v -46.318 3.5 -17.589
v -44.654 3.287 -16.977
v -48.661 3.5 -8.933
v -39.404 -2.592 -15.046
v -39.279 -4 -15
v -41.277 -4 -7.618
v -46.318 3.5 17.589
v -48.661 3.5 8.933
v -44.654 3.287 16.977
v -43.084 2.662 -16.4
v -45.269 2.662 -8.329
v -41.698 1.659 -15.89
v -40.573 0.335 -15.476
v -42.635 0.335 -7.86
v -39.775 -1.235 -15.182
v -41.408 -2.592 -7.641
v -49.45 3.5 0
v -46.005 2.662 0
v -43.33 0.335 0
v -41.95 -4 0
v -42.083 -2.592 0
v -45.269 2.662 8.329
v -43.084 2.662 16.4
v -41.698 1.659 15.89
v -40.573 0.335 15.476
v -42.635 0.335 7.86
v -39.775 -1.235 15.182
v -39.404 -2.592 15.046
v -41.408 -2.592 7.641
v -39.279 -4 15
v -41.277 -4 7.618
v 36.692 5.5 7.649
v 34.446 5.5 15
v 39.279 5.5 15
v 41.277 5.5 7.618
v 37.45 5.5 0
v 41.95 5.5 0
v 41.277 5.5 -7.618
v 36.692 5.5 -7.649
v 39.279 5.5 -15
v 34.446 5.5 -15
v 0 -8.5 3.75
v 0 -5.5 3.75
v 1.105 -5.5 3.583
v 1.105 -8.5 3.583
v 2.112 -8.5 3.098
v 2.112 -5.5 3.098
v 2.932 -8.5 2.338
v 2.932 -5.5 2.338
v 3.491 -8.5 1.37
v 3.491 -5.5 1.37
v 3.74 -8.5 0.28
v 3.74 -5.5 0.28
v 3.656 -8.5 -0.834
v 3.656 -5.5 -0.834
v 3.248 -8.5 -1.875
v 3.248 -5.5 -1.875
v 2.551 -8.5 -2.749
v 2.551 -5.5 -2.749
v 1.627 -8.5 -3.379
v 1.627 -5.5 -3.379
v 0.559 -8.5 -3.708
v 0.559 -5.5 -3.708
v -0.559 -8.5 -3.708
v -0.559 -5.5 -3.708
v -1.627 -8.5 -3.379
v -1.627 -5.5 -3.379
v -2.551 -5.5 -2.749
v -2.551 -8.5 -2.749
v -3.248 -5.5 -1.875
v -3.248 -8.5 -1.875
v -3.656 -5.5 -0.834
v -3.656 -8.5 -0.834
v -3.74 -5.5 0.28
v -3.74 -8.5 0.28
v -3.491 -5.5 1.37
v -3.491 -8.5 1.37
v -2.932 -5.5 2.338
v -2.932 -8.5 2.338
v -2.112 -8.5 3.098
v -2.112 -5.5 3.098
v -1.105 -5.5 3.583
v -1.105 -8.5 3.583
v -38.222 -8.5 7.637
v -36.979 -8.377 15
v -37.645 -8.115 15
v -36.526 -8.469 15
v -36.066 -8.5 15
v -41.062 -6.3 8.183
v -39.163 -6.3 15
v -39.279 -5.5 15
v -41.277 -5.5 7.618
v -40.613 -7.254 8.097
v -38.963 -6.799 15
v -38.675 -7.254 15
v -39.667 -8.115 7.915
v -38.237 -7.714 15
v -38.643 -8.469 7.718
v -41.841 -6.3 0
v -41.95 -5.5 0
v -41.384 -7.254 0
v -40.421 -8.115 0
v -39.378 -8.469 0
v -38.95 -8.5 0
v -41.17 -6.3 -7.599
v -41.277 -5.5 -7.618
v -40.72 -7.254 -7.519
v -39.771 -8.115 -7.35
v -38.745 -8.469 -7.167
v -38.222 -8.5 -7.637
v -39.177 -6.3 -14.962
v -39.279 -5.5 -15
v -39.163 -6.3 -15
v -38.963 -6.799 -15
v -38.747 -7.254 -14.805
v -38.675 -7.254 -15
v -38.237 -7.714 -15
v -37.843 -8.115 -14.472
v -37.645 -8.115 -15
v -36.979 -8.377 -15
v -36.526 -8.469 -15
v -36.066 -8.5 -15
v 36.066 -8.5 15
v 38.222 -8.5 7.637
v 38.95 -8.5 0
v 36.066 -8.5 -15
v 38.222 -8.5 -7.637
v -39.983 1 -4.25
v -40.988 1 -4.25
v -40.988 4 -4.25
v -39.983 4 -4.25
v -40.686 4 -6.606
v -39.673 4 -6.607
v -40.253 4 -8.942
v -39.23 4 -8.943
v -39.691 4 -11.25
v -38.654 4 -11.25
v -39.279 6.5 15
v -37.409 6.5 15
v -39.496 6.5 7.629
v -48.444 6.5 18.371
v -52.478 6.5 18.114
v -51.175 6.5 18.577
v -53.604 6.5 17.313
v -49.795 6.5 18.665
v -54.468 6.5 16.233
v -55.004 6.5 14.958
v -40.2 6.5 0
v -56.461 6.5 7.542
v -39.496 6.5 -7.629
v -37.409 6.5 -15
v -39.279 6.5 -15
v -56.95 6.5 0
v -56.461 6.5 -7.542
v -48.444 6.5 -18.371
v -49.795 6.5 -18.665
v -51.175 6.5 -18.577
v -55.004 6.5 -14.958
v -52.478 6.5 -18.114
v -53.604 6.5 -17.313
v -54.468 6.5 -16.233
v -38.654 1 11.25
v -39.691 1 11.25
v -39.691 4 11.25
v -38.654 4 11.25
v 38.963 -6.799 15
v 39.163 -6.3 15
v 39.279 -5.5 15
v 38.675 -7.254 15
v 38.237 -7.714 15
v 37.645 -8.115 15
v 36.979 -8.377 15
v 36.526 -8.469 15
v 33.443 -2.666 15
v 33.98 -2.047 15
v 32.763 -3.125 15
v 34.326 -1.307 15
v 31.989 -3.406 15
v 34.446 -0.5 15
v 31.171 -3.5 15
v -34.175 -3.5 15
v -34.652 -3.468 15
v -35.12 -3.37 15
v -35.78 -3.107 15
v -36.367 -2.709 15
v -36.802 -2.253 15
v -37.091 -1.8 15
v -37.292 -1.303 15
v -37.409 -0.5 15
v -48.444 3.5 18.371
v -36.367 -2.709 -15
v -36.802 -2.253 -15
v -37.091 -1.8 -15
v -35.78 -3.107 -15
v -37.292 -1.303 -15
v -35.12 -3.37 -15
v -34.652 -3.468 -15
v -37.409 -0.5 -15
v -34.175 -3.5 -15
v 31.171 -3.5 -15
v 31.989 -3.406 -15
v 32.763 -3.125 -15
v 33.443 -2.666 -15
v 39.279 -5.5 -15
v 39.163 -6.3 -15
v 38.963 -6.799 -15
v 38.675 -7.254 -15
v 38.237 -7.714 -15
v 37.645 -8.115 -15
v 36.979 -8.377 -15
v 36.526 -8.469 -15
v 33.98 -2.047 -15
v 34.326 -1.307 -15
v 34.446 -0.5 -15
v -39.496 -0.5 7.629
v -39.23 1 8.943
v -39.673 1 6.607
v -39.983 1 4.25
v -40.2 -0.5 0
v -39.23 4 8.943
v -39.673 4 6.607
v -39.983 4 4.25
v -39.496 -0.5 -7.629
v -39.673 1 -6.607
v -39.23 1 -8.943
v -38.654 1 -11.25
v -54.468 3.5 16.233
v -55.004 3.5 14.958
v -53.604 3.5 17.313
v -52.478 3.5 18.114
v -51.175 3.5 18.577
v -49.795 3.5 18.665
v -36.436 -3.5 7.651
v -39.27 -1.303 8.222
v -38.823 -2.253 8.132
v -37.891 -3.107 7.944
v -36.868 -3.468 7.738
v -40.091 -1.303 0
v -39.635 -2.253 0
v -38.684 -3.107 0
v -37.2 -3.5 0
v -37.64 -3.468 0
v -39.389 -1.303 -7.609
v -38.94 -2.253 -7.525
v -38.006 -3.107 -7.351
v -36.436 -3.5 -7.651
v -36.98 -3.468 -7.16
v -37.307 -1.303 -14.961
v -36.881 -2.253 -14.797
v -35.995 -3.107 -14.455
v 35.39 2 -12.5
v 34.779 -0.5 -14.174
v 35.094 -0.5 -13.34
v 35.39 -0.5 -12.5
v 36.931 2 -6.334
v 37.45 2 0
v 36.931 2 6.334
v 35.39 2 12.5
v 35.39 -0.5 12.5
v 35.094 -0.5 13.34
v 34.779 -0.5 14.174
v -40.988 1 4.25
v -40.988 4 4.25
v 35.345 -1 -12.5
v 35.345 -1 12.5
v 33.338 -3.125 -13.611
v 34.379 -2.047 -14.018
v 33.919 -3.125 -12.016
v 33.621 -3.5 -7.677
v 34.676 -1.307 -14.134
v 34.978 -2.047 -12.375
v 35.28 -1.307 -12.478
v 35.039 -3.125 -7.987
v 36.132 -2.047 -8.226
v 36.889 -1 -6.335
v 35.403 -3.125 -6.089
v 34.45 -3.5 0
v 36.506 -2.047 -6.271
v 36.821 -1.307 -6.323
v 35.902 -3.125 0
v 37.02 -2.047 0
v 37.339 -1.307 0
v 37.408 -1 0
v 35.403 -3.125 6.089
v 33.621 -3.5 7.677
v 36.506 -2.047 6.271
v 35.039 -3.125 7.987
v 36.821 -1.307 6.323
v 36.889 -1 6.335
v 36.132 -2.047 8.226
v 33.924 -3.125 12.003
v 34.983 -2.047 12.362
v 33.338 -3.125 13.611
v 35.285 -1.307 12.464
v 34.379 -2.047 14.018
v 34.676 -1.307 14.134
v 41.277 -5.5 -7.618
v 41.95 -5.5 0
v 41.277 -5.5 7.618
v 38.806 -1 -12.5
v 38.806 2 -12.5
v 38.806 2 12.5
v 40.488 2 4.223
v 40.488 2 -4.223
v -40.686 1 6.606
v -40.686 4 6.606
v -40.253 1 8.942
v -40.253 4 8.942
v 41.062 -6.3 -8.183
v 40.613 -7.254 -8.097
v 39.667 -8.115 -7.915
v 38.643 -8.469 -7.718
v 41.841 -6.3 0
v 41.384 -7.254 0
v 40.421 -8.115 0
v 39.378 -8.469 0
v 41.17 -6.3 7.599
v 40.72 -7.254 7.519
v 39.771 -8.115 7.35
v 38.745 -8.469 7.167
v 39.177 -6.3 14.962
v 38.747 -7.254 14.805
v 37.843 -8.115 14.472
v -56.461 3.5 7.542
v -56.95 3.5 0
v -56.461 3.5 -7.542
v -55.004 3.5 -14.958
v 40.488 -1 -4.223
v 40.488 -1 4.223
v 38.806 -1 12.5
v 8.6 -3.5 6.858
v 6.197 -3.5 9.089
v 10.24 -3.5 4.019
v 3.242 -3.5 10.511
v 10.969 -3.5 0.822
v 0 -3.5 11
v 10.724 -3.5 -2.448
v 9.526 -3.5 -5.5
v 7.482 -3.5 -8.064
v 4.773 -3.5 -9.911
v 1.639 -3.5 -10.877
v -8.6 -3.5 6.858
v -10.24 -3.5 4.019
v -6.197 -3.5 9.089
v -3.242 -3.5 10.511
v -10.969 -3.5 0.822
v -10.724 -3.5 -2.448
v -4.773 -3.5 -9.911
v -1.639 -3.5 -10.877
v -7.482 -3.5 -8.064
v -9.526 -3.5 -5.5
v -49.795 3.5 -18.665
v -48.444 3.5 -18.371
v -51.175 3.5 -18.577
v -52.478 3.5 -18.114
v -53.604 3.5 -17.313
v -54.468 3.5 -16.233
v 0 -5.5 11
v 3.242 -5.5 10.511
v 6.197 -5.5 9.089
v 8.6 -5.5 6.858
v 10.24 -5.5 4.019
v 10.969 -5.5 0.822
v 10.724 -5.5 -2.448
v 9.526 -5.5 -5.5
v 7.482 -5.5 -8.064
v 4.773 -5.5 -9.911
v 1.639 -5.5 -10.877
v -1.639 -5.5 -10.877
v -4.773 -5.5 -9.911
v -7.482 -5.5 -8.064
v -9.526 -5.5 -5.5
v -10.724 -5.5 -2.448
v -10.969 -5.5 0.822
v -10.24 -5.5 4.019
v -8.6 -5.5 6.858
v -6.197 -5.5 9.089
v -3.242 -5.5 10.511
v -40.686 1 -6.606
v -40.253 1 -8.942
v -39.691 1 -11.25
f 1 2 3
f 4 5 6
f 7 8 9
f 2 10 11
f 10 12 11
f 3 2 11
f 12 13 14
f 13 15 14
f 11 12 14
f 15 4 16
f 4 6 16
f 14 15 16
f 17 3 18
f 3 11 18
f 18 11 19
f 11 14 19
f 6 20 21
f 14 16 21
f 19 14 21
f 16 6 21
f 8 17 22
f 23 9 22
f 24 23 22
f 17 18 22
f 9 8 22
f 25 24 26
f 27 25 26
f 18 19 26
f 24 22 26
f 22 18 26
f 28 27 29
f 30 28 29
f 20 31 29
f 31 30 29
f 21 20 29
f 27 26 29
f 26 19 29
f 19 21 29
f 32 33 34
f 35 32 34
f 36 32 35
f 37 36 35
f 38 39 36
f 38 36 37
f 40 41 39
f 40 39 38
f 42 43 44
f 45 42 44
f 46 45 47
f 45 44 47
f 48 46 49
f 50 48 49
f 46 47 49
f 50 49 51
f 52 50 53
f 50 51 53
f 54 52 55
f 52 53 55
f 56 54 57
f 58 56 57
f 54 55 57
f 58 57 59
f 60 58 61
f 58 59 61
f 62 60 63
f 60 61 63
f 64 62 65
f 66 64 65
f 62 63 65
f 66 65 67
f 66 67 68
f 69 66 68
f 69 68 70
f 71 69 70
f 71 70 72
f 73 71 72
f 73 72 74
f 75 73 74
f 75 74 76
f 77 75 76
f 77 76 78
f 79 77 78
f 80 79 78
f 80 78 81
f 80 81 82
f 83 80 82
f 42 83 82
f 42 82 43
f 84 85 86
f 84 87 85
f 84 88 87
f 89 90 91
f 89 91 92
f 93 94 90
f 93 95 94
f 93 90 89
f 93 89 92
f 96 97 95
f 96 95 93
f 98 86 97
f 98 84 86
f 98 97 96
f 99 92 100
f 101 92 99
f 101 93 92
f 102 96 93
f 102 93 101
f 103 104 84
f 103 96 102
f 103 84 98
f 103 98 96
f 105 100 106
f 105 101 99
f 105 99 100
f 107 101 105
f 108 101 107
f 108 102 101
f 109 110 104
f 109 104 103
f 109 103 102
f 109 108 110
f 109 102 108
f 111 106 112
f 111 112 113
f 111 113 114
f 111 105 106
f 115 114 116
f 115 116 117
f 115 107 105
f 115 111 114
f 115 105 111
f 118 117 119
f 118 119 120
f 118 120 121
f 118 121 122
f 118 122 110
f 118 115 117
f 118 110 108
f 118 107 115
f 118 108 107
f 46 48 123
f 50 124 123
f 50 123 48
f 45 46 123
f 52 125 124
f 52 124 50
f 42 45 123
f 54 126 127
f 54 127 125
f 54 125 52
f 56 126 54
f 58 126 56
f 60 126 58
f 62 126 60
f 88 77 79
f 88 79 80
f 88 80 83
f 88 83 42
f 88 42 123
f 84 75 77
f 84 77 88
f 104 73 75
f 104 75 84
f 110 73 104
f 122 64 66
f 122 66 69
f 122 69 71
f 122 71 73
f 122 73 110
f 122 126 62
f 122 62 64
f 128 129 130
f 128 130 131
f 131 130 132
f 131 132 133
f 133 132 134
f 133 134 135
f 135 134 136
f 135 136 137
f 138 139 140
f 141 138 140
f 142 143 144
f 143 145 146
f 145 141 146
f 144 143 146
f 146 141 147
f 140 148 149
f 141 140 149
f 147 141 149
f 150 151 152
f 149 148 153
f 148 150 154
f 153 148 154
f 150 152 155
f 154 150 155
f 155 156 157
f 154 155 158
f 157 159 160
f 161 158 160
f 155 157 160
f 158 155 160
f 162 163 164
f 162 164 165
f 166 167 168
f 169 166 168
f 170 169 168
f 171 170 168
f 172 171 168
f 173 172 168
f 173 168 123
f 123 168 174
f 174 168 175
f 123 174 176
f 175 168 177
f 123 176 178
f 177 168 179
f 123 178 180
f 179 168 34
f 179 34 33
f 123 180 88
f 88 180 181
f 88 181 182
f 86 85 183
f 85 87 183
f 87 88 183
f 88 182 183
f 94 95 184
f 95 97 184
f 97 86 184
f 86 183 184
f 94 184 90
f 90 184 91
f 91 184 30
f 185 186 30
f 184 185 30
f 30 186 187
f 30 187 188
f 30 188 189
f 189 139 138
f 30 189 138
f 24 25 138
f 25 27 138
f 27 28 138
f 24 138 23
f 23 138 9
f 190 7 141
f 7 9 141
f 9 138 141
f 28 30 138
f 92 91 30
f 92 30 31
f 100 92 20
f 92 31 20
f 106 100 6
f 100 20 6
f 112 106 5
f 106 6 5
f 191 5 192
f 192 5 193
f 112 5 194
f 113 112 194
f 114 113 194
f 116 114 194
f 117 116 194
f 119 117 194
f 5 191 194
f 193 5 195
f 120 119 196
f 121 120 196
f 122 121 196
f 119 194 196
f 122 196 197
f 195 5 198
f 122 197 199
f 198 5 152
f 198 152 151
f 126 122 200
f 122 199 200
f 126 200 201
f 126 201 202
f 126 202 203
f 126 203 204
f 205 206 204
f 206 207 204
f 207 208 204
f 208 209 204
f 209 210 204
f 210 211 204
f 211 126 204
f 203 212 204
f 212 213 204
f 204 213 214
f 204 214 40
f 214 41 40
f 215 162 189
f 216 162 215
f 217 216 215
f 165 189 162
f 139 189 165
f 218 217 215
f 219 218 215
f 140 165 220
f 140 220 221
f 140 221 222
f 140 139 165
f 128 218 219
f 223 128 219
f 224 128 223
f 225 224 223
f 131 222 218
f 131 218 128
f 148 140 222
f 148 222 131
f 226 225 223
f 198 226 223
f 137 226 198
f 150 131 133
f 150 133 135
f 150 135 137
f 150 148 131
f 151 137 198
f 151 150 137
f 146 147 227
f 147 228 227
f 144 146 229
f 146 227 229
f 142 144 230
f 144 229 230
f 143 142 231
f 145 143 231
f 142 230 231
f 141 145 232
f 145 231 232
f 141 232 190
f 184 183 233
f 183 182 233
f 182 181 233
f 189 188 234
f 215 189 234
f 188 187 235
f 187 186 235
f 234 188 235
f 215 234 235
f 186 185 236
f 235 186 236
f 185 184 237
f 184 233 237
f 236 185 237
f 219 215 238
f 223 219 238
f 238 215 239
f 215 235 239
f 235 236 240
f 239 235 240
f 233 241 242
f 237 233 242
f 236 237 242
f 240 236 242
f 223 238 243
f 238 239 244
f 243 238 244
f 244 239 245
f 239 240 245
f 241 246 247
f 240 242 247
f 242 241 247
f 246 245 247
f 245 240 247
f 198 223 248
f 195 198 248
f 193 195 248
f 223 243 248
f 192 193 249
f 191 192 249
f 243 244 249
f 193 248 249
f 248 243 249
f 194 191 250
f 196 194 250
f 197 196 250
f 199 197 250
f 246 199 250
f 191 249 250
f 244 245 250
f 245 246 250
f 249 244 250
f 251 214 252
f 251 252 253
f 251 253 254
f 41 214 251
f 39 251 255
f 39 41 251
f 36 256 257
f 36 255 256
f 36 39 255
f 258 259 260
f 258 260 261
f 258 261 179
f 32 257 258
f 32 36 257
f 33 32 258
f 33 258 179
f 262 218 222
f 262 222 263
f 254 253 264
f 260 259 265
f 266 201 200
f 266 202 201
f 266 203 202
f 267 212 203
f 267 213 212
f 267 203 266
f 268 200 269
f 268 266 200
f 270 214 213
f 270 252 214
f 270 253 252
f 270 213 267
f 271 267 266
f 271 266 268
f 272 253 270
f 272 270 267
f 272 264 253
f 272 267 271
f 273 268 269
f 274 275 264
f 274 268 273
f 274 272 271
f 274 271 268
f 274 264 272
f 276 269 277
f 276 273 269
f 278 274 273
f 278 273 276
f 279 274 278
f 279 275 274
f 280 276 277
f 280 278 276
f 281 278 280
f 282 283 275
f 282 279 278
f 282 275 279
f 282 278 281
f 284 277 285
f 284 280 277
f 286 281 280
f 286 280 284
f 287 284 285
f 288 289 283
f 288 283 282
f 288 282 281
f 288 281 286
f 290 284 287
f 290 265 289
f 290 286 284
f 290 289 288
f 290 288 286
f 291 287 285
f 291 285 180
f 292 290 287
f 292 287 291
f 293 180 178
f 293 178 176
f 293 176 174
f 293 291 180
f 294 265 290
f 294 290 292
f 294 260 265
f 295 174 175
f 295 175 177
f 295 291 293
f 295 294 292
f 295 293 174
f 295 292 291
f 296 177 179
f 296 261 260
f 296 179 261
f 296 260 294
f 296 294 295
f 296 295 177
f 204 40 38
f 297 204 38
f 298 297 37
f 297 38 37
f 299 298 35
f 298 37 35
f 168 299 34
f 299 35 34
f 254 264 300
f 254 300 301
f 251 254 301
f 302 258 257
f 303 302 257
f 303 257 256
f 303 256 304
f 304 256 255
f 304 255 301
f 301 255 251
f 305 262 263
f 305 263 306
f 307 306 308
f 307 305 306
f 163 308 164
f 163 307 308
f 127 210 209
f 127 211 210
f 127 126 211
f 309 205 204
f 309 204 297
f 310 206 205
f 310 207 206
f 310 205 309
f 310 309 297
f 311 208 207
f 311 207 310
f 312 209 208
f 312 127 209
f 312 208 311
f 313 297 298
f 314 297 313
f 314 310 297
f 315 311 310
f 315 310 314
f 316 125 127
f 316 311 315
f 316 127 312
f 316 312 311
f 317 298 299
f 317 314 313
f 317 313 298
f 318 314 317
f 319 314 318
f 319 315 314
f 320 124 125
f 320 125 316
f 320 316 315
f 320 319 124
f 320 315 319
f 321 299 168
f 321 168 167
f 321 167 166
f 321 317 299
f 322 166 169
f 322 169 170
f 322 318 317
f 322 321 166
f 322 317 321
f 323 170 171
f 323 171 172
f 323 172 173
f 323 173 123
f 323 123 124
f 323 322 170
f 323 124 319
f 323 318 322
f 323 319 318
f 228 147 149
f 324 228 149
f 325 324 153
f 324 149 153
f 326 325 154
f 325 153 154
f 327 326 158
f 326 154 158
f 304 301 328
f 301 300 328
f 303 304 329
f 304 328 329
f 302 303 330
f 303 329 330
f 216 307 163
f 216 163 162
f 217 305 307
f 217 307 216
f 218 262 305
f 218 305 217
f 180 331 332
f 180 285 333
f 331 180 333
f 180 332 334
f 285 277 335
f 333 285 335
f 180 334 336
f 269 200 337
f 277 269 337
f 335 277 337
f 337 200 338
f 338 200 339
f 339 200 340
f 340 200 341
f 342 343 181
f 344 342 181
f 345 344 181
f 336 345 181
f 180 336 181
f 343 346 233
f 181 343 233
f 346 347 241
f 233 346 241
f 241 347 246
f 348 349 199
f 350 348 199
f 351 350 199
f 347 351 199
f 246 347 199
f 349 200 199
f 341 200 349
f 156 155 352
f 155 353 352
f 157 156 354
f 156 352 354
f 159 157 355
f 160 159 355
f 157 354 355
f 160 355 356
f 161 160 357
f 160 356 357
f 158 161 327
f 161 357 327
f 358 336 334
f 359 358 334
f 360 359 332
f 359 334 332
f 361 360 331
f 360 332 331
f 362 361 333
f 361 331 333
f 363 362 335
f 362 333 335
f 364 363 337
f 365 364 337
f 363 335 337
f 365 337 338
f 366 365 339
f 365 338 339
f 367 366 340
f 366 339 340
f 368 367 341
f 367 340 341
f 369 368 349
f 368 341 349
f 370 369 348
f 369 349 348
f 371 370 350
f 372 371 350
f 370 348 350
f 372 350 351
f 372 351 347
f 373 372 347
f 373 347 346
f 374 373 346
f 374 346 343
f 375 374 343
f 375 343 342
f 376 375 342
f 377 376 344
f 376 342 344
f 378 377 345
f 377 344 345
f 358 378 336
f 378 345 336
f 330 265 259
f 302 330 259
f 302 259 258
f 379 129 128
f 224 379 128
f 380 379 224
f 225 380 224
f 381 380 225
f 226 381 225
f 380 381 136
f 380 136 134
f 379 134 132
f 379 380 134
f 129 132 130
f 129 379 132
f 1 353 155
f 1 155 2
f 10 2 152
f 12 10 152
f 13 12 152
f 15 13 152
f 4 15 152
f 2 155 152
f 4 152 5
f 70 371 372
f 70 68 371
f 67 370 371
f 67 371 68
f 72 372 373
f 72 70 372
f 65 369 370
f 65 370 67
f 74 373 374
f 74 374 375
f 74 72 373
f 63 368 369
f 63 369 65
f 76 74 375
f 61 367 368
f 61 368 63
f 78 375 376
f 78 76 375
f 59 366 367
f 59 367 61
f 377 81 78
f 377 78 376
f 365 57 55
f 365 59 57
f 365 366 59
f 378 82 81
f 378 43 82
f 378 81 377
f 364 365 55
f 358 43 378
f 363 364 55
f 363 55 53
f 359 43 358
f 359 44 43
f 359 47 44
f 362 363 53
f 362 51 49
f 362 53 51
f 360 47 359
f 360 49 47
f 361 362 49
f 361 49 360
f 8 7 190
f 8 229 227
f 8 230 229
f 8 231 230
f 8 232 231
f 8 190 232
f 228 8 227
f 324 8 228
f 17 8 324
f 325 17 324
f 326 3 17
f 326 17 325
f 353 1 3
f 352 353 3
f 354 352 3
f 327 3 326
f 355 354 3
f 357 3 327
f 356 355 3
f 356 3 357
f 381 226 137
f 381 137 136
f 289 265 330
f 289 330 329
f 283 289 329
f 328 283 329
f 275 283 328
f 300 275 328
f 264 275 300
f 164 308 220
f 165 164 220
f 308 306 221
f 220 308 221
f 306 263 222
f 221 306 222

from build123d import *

# Parameters (mm, degrees)
BOSS_EXTRUDE1_DEPTH      = 8.5
CUT_EXTRUDE4_DEPTH       = 12
FILLET1_R                = 3
CUT_EXTRUDE5_DEPTH       = 46.354741112
CUT_EXTRUDE5_DEPTH_BACK  = 46.354741112
SKETCH6_W                = 4.541260622
SKETCH6_H                = 2
CUT_EXTRUDE6_START       = 1
CUT_EXTRUDE6_DEPTH       = 3
CUT_EXTRUDE7_REACH       = 47.355
CUT_EXTRUDE7_END_RADIUS  = 42.2
SKETCH8_W                = 25
SKETCH8_H                = 3
BOSS_EXTRUDE2_START      = 6.5
BOSS_EXTRUDE2_DEPTH      = 3
FILLET2_R                = 5
SKETCH10_R               = 11
CUT_EXTRUDE8_DEPTH       = 2
CUT_EXTRUDE9_REACH       = 63.124
SKETCH11_R               = 3.75
FILLET3_R                = 7.5
CUT_EXTRUDE10_DEPTH      = 61.534679882
CUT_EXTRUDE10_DEPTH_BACK = 61.534679882
SKETCH12_W               = 19.340558592
SKETCH12_H               = 3


# Read off the part's stored shape, not the designer's step: Cut-Extrude6
with BuildPart() as part:
    # Sketch1 → Boss-Extrude1 (new, symmetric)
    with BuildSketch(Plane(origin=(0, 0, 0), x_dir=(1, 0, 0), z_dir=(0, 1, 0))):
        with BuildLine():
            Line((-39.278701549, 15), (39.278701549, 15))
            ThreePointArc((39.278701549, 15), (41.95, 0), (39.278701549, -15))
            Line((39.278701549, -15), (-39.278701549, -15))
            ThreePointArc((-39.278701549, -15), (-41.95, 0), (-39.278701549, 15))
        make_face()
    extrude(amount=BOSS_EXTRUDE1_DEPTH, both=True)

    # Sketch5 → Cut-Extrude4 (cut)
    with BuildSketch(Plane(origin=(0, 8.5, 0), x_dir=(1, 0, 0), z_dir=(0, 1, 0))):
        with BuildLine():
            Line((-37.408739378, 15), (34.445827296, 15))
            ThreePointArc((34.445827296, 15), (37.45, 0), (34.445827296, -15))
            Line((34.445827296, -15), (-37.408739378, -15))
            ThreePointArc((-37.408739378, -15), (-40.2, 0), (-37.408739378, 15))
        make_face()
    extrude(amount=-CUT_EXTRUDE4_DEPTH, mode=Mode.SUBTRACT)

    # Fillet1
    fillet1_edges = [part.edges().sort_by_distance(p)[0] for p in [
        (-40.2, -3.5, 0),
        (37.45, -3.5, 0),
        (-41.95, -8.5, 0),
        (41.95, -8.5, 0),
    ]]
    fillet(fillet1_edges, radius=FILLET1_R)

    # Sketch6 → Cut-Extrude5 (cut, two sides: drawn at the far end of the back side and taken through both)
    with BuildSketch(Plane.XY.offset(-CUT_EXTRUDE5_DEPTH_BACK)):
        with Locations((-39.679369689, 7.5)):
            Rectangle(SKETCH6_W, SKETCH6_H)
    extrude(amount=CUT_EXTRUDE5_DEPTH + CUT_EXTRUDE5_DEPTH_BACK, mode=Mode.SUBTRACT)

    # Cut-Extrude6 outline → Cut-Extrude6 (cut)
    with BuildSketch(Plane(origin=(0, 0, 0), x_dir=(1, 0, 0), z_dir=(0, 1, 0)).offset(CUT_EXTRUDE6_START)):
        with BuildLine():
            ThreePointArc((-40.987968885, -4.25), (-40.485797555, -7.777069093), (-39.691352248, -11.25))
            Line((-39.691352248, -11.25), (-38.653798077, -11.25))
            ThreePointArc((-38.653798077, -11.25), (-39.468108328, -7.778438147), (-39.982857905, -4.25))
            Line((-39.982857905, -4.25), (-40.987968885, -4.25))
        make_face()
        with BuildLine():
            Line((-40.987968885, 4.25), (-39.982857905, 4.25))
            ThreePointArc((-39.982857905, 4.25), (-39.468108328, 7.778438147), (-38.653798077, 11.25))
            Line((-38.653798077, 11.25), (-39.691352248, 11.25))
            ThreePointArc((-39.691352248, 11.25), (-40.485797555, 7.777069093), (-40.987968885, 4.25))
        make_face()
    extrude(amount=CUT_EXTRUDE6_DEPTH, mode=Mode.SUBTRACT)

    # Cut-Extrude7: up to this cylinder (the profile starts inside it)
    cut_extrude7_end = Plane(origin=(-1.5, 0.5, 0), z_dir=(0, -1, 0)) * Cylinder(CUT_EXTRUDE7_END_RADIUS, 180.11, mode=Mode.PRIVATE)
    # Sketch8 → Cut-Extrude7 (cut, up to the surface)
    with BuildSketch(Plane(origin=(0, 0, 0), x_dir=(0, 0, -1), z_dir=(1, 0, 0)), mode=Mode.PRIVATE) as cut_extrude7_sk1:
        with Locations((0, 0.5)):
            Rectangle(SKETCH8_W, SKETCH8_H)
    cut_extrude7_tool1 = extrude(cut_extrude7_sk1.sketch, amount=CUT_EXTRUDE7_REACH, mode=Mode.PRIVATE) & cut_extrude7_end
    add(cut_extrude7_tool1.solids().sort_by_distance((0, 0.5, 0))[0], mode=Mode.SUBTRACT)

    # Sketch9 → Boss-Extrude2 (add)
    with BuildSketch(Plane(origin=(0, 0, 0), x_dir=(1, 0, 0), z_dir=(0, 1, 0)).offset(BOSS_EXTRUDE2_START)):
        with BuildLine():
            Line((-53.356504155, 20.178365938), (-39.278701549, 15))
            ThreePointArc((-39.278701549, 15), (-41.95, 0), (-39.278701549, -15))
            Line((-39.278701549, -15), (-53.356504155, -20.178365938))
            ThreePointArc((-53.356504155, -20.178365938), (-56.95, 0), (-53.356504155, 20.178365938))
        make_face()
    extrude(amount=-BOSS_EXTRUDE2_DEPTH)

    # Fillet2
    fillet2_edges = [part.edges().sort_by_distance(p)[0] for p in [
        (-53.356504155, 5, 20.178365938),
        (-53.356504155, 5, -20.178365938),
    ]]
    fillet(fillet2_edges, radius=FILLET2_R)

    # Sketch10 → Cut-Extrude8 (cut)
    with BuildSketch(Plane(origin=(0, -3.5, 0), x_dir=(1, 0, 0), z_dir=(0, 1, 0))):
        with Locations(Location((0, 0, 0), (0, 0, 270))):
            Circle(SKETCH10_R)
    extrude(amount=-CUT_EXTRUDE8_DEPTH, mode=Mode.SUBTRACT)

    # Sketch11 → Cut-Extrude9 (cut, up to next)
    with BuildSketch(Plane(origin=(0, -3.5, 0), x_dir=(1, 0, 0), z_dir=(0, 1, 0)), mode=Mode.PRIVATE) as cut_extrude9_sk1:
        with Locations(Location((0, 0, 0), (0, 0, 270))):
            Circle(SKETCH11_R)
    cut_extrude9_tool1 = extrude(cut_extrude9_sk1.sketch, amount=-CUT_EXTRUDE9_REACH, mode=Mode.PRIVATE) & part.part
    add(cut_extrude9_tool1.solids().sort_by_distance((0, -3.5, 0))[0], mode=Mode.SUBTRACT)

    # Fillet3
    fillet3_edges = [part.edges().sort_by_distance(p)[0] for p in [
        (-41.95, 3.5, 0),
    ]]
    fillet(fillet3_edges, radius=FILLET3_R)

    # Sketch12 → Cut-Extrude10 (cut, two sides: drawn at the far end of the back side and taken through both)
    with BuildSketch(Plane.XY.offset(-CUT_EXTRUDE10_DEPTH_BACK)):
        with Locations((38.128696485, 7)):
            Rectangle(SKETCH12_W, SKETCH12_H)
    extrude(amount=CUT_EXTRUDE10_DEPTH + CUT_EXTRUDE10_DEPTH_BACK, mode=Mode.SUBTRACT)


solid = part.part
